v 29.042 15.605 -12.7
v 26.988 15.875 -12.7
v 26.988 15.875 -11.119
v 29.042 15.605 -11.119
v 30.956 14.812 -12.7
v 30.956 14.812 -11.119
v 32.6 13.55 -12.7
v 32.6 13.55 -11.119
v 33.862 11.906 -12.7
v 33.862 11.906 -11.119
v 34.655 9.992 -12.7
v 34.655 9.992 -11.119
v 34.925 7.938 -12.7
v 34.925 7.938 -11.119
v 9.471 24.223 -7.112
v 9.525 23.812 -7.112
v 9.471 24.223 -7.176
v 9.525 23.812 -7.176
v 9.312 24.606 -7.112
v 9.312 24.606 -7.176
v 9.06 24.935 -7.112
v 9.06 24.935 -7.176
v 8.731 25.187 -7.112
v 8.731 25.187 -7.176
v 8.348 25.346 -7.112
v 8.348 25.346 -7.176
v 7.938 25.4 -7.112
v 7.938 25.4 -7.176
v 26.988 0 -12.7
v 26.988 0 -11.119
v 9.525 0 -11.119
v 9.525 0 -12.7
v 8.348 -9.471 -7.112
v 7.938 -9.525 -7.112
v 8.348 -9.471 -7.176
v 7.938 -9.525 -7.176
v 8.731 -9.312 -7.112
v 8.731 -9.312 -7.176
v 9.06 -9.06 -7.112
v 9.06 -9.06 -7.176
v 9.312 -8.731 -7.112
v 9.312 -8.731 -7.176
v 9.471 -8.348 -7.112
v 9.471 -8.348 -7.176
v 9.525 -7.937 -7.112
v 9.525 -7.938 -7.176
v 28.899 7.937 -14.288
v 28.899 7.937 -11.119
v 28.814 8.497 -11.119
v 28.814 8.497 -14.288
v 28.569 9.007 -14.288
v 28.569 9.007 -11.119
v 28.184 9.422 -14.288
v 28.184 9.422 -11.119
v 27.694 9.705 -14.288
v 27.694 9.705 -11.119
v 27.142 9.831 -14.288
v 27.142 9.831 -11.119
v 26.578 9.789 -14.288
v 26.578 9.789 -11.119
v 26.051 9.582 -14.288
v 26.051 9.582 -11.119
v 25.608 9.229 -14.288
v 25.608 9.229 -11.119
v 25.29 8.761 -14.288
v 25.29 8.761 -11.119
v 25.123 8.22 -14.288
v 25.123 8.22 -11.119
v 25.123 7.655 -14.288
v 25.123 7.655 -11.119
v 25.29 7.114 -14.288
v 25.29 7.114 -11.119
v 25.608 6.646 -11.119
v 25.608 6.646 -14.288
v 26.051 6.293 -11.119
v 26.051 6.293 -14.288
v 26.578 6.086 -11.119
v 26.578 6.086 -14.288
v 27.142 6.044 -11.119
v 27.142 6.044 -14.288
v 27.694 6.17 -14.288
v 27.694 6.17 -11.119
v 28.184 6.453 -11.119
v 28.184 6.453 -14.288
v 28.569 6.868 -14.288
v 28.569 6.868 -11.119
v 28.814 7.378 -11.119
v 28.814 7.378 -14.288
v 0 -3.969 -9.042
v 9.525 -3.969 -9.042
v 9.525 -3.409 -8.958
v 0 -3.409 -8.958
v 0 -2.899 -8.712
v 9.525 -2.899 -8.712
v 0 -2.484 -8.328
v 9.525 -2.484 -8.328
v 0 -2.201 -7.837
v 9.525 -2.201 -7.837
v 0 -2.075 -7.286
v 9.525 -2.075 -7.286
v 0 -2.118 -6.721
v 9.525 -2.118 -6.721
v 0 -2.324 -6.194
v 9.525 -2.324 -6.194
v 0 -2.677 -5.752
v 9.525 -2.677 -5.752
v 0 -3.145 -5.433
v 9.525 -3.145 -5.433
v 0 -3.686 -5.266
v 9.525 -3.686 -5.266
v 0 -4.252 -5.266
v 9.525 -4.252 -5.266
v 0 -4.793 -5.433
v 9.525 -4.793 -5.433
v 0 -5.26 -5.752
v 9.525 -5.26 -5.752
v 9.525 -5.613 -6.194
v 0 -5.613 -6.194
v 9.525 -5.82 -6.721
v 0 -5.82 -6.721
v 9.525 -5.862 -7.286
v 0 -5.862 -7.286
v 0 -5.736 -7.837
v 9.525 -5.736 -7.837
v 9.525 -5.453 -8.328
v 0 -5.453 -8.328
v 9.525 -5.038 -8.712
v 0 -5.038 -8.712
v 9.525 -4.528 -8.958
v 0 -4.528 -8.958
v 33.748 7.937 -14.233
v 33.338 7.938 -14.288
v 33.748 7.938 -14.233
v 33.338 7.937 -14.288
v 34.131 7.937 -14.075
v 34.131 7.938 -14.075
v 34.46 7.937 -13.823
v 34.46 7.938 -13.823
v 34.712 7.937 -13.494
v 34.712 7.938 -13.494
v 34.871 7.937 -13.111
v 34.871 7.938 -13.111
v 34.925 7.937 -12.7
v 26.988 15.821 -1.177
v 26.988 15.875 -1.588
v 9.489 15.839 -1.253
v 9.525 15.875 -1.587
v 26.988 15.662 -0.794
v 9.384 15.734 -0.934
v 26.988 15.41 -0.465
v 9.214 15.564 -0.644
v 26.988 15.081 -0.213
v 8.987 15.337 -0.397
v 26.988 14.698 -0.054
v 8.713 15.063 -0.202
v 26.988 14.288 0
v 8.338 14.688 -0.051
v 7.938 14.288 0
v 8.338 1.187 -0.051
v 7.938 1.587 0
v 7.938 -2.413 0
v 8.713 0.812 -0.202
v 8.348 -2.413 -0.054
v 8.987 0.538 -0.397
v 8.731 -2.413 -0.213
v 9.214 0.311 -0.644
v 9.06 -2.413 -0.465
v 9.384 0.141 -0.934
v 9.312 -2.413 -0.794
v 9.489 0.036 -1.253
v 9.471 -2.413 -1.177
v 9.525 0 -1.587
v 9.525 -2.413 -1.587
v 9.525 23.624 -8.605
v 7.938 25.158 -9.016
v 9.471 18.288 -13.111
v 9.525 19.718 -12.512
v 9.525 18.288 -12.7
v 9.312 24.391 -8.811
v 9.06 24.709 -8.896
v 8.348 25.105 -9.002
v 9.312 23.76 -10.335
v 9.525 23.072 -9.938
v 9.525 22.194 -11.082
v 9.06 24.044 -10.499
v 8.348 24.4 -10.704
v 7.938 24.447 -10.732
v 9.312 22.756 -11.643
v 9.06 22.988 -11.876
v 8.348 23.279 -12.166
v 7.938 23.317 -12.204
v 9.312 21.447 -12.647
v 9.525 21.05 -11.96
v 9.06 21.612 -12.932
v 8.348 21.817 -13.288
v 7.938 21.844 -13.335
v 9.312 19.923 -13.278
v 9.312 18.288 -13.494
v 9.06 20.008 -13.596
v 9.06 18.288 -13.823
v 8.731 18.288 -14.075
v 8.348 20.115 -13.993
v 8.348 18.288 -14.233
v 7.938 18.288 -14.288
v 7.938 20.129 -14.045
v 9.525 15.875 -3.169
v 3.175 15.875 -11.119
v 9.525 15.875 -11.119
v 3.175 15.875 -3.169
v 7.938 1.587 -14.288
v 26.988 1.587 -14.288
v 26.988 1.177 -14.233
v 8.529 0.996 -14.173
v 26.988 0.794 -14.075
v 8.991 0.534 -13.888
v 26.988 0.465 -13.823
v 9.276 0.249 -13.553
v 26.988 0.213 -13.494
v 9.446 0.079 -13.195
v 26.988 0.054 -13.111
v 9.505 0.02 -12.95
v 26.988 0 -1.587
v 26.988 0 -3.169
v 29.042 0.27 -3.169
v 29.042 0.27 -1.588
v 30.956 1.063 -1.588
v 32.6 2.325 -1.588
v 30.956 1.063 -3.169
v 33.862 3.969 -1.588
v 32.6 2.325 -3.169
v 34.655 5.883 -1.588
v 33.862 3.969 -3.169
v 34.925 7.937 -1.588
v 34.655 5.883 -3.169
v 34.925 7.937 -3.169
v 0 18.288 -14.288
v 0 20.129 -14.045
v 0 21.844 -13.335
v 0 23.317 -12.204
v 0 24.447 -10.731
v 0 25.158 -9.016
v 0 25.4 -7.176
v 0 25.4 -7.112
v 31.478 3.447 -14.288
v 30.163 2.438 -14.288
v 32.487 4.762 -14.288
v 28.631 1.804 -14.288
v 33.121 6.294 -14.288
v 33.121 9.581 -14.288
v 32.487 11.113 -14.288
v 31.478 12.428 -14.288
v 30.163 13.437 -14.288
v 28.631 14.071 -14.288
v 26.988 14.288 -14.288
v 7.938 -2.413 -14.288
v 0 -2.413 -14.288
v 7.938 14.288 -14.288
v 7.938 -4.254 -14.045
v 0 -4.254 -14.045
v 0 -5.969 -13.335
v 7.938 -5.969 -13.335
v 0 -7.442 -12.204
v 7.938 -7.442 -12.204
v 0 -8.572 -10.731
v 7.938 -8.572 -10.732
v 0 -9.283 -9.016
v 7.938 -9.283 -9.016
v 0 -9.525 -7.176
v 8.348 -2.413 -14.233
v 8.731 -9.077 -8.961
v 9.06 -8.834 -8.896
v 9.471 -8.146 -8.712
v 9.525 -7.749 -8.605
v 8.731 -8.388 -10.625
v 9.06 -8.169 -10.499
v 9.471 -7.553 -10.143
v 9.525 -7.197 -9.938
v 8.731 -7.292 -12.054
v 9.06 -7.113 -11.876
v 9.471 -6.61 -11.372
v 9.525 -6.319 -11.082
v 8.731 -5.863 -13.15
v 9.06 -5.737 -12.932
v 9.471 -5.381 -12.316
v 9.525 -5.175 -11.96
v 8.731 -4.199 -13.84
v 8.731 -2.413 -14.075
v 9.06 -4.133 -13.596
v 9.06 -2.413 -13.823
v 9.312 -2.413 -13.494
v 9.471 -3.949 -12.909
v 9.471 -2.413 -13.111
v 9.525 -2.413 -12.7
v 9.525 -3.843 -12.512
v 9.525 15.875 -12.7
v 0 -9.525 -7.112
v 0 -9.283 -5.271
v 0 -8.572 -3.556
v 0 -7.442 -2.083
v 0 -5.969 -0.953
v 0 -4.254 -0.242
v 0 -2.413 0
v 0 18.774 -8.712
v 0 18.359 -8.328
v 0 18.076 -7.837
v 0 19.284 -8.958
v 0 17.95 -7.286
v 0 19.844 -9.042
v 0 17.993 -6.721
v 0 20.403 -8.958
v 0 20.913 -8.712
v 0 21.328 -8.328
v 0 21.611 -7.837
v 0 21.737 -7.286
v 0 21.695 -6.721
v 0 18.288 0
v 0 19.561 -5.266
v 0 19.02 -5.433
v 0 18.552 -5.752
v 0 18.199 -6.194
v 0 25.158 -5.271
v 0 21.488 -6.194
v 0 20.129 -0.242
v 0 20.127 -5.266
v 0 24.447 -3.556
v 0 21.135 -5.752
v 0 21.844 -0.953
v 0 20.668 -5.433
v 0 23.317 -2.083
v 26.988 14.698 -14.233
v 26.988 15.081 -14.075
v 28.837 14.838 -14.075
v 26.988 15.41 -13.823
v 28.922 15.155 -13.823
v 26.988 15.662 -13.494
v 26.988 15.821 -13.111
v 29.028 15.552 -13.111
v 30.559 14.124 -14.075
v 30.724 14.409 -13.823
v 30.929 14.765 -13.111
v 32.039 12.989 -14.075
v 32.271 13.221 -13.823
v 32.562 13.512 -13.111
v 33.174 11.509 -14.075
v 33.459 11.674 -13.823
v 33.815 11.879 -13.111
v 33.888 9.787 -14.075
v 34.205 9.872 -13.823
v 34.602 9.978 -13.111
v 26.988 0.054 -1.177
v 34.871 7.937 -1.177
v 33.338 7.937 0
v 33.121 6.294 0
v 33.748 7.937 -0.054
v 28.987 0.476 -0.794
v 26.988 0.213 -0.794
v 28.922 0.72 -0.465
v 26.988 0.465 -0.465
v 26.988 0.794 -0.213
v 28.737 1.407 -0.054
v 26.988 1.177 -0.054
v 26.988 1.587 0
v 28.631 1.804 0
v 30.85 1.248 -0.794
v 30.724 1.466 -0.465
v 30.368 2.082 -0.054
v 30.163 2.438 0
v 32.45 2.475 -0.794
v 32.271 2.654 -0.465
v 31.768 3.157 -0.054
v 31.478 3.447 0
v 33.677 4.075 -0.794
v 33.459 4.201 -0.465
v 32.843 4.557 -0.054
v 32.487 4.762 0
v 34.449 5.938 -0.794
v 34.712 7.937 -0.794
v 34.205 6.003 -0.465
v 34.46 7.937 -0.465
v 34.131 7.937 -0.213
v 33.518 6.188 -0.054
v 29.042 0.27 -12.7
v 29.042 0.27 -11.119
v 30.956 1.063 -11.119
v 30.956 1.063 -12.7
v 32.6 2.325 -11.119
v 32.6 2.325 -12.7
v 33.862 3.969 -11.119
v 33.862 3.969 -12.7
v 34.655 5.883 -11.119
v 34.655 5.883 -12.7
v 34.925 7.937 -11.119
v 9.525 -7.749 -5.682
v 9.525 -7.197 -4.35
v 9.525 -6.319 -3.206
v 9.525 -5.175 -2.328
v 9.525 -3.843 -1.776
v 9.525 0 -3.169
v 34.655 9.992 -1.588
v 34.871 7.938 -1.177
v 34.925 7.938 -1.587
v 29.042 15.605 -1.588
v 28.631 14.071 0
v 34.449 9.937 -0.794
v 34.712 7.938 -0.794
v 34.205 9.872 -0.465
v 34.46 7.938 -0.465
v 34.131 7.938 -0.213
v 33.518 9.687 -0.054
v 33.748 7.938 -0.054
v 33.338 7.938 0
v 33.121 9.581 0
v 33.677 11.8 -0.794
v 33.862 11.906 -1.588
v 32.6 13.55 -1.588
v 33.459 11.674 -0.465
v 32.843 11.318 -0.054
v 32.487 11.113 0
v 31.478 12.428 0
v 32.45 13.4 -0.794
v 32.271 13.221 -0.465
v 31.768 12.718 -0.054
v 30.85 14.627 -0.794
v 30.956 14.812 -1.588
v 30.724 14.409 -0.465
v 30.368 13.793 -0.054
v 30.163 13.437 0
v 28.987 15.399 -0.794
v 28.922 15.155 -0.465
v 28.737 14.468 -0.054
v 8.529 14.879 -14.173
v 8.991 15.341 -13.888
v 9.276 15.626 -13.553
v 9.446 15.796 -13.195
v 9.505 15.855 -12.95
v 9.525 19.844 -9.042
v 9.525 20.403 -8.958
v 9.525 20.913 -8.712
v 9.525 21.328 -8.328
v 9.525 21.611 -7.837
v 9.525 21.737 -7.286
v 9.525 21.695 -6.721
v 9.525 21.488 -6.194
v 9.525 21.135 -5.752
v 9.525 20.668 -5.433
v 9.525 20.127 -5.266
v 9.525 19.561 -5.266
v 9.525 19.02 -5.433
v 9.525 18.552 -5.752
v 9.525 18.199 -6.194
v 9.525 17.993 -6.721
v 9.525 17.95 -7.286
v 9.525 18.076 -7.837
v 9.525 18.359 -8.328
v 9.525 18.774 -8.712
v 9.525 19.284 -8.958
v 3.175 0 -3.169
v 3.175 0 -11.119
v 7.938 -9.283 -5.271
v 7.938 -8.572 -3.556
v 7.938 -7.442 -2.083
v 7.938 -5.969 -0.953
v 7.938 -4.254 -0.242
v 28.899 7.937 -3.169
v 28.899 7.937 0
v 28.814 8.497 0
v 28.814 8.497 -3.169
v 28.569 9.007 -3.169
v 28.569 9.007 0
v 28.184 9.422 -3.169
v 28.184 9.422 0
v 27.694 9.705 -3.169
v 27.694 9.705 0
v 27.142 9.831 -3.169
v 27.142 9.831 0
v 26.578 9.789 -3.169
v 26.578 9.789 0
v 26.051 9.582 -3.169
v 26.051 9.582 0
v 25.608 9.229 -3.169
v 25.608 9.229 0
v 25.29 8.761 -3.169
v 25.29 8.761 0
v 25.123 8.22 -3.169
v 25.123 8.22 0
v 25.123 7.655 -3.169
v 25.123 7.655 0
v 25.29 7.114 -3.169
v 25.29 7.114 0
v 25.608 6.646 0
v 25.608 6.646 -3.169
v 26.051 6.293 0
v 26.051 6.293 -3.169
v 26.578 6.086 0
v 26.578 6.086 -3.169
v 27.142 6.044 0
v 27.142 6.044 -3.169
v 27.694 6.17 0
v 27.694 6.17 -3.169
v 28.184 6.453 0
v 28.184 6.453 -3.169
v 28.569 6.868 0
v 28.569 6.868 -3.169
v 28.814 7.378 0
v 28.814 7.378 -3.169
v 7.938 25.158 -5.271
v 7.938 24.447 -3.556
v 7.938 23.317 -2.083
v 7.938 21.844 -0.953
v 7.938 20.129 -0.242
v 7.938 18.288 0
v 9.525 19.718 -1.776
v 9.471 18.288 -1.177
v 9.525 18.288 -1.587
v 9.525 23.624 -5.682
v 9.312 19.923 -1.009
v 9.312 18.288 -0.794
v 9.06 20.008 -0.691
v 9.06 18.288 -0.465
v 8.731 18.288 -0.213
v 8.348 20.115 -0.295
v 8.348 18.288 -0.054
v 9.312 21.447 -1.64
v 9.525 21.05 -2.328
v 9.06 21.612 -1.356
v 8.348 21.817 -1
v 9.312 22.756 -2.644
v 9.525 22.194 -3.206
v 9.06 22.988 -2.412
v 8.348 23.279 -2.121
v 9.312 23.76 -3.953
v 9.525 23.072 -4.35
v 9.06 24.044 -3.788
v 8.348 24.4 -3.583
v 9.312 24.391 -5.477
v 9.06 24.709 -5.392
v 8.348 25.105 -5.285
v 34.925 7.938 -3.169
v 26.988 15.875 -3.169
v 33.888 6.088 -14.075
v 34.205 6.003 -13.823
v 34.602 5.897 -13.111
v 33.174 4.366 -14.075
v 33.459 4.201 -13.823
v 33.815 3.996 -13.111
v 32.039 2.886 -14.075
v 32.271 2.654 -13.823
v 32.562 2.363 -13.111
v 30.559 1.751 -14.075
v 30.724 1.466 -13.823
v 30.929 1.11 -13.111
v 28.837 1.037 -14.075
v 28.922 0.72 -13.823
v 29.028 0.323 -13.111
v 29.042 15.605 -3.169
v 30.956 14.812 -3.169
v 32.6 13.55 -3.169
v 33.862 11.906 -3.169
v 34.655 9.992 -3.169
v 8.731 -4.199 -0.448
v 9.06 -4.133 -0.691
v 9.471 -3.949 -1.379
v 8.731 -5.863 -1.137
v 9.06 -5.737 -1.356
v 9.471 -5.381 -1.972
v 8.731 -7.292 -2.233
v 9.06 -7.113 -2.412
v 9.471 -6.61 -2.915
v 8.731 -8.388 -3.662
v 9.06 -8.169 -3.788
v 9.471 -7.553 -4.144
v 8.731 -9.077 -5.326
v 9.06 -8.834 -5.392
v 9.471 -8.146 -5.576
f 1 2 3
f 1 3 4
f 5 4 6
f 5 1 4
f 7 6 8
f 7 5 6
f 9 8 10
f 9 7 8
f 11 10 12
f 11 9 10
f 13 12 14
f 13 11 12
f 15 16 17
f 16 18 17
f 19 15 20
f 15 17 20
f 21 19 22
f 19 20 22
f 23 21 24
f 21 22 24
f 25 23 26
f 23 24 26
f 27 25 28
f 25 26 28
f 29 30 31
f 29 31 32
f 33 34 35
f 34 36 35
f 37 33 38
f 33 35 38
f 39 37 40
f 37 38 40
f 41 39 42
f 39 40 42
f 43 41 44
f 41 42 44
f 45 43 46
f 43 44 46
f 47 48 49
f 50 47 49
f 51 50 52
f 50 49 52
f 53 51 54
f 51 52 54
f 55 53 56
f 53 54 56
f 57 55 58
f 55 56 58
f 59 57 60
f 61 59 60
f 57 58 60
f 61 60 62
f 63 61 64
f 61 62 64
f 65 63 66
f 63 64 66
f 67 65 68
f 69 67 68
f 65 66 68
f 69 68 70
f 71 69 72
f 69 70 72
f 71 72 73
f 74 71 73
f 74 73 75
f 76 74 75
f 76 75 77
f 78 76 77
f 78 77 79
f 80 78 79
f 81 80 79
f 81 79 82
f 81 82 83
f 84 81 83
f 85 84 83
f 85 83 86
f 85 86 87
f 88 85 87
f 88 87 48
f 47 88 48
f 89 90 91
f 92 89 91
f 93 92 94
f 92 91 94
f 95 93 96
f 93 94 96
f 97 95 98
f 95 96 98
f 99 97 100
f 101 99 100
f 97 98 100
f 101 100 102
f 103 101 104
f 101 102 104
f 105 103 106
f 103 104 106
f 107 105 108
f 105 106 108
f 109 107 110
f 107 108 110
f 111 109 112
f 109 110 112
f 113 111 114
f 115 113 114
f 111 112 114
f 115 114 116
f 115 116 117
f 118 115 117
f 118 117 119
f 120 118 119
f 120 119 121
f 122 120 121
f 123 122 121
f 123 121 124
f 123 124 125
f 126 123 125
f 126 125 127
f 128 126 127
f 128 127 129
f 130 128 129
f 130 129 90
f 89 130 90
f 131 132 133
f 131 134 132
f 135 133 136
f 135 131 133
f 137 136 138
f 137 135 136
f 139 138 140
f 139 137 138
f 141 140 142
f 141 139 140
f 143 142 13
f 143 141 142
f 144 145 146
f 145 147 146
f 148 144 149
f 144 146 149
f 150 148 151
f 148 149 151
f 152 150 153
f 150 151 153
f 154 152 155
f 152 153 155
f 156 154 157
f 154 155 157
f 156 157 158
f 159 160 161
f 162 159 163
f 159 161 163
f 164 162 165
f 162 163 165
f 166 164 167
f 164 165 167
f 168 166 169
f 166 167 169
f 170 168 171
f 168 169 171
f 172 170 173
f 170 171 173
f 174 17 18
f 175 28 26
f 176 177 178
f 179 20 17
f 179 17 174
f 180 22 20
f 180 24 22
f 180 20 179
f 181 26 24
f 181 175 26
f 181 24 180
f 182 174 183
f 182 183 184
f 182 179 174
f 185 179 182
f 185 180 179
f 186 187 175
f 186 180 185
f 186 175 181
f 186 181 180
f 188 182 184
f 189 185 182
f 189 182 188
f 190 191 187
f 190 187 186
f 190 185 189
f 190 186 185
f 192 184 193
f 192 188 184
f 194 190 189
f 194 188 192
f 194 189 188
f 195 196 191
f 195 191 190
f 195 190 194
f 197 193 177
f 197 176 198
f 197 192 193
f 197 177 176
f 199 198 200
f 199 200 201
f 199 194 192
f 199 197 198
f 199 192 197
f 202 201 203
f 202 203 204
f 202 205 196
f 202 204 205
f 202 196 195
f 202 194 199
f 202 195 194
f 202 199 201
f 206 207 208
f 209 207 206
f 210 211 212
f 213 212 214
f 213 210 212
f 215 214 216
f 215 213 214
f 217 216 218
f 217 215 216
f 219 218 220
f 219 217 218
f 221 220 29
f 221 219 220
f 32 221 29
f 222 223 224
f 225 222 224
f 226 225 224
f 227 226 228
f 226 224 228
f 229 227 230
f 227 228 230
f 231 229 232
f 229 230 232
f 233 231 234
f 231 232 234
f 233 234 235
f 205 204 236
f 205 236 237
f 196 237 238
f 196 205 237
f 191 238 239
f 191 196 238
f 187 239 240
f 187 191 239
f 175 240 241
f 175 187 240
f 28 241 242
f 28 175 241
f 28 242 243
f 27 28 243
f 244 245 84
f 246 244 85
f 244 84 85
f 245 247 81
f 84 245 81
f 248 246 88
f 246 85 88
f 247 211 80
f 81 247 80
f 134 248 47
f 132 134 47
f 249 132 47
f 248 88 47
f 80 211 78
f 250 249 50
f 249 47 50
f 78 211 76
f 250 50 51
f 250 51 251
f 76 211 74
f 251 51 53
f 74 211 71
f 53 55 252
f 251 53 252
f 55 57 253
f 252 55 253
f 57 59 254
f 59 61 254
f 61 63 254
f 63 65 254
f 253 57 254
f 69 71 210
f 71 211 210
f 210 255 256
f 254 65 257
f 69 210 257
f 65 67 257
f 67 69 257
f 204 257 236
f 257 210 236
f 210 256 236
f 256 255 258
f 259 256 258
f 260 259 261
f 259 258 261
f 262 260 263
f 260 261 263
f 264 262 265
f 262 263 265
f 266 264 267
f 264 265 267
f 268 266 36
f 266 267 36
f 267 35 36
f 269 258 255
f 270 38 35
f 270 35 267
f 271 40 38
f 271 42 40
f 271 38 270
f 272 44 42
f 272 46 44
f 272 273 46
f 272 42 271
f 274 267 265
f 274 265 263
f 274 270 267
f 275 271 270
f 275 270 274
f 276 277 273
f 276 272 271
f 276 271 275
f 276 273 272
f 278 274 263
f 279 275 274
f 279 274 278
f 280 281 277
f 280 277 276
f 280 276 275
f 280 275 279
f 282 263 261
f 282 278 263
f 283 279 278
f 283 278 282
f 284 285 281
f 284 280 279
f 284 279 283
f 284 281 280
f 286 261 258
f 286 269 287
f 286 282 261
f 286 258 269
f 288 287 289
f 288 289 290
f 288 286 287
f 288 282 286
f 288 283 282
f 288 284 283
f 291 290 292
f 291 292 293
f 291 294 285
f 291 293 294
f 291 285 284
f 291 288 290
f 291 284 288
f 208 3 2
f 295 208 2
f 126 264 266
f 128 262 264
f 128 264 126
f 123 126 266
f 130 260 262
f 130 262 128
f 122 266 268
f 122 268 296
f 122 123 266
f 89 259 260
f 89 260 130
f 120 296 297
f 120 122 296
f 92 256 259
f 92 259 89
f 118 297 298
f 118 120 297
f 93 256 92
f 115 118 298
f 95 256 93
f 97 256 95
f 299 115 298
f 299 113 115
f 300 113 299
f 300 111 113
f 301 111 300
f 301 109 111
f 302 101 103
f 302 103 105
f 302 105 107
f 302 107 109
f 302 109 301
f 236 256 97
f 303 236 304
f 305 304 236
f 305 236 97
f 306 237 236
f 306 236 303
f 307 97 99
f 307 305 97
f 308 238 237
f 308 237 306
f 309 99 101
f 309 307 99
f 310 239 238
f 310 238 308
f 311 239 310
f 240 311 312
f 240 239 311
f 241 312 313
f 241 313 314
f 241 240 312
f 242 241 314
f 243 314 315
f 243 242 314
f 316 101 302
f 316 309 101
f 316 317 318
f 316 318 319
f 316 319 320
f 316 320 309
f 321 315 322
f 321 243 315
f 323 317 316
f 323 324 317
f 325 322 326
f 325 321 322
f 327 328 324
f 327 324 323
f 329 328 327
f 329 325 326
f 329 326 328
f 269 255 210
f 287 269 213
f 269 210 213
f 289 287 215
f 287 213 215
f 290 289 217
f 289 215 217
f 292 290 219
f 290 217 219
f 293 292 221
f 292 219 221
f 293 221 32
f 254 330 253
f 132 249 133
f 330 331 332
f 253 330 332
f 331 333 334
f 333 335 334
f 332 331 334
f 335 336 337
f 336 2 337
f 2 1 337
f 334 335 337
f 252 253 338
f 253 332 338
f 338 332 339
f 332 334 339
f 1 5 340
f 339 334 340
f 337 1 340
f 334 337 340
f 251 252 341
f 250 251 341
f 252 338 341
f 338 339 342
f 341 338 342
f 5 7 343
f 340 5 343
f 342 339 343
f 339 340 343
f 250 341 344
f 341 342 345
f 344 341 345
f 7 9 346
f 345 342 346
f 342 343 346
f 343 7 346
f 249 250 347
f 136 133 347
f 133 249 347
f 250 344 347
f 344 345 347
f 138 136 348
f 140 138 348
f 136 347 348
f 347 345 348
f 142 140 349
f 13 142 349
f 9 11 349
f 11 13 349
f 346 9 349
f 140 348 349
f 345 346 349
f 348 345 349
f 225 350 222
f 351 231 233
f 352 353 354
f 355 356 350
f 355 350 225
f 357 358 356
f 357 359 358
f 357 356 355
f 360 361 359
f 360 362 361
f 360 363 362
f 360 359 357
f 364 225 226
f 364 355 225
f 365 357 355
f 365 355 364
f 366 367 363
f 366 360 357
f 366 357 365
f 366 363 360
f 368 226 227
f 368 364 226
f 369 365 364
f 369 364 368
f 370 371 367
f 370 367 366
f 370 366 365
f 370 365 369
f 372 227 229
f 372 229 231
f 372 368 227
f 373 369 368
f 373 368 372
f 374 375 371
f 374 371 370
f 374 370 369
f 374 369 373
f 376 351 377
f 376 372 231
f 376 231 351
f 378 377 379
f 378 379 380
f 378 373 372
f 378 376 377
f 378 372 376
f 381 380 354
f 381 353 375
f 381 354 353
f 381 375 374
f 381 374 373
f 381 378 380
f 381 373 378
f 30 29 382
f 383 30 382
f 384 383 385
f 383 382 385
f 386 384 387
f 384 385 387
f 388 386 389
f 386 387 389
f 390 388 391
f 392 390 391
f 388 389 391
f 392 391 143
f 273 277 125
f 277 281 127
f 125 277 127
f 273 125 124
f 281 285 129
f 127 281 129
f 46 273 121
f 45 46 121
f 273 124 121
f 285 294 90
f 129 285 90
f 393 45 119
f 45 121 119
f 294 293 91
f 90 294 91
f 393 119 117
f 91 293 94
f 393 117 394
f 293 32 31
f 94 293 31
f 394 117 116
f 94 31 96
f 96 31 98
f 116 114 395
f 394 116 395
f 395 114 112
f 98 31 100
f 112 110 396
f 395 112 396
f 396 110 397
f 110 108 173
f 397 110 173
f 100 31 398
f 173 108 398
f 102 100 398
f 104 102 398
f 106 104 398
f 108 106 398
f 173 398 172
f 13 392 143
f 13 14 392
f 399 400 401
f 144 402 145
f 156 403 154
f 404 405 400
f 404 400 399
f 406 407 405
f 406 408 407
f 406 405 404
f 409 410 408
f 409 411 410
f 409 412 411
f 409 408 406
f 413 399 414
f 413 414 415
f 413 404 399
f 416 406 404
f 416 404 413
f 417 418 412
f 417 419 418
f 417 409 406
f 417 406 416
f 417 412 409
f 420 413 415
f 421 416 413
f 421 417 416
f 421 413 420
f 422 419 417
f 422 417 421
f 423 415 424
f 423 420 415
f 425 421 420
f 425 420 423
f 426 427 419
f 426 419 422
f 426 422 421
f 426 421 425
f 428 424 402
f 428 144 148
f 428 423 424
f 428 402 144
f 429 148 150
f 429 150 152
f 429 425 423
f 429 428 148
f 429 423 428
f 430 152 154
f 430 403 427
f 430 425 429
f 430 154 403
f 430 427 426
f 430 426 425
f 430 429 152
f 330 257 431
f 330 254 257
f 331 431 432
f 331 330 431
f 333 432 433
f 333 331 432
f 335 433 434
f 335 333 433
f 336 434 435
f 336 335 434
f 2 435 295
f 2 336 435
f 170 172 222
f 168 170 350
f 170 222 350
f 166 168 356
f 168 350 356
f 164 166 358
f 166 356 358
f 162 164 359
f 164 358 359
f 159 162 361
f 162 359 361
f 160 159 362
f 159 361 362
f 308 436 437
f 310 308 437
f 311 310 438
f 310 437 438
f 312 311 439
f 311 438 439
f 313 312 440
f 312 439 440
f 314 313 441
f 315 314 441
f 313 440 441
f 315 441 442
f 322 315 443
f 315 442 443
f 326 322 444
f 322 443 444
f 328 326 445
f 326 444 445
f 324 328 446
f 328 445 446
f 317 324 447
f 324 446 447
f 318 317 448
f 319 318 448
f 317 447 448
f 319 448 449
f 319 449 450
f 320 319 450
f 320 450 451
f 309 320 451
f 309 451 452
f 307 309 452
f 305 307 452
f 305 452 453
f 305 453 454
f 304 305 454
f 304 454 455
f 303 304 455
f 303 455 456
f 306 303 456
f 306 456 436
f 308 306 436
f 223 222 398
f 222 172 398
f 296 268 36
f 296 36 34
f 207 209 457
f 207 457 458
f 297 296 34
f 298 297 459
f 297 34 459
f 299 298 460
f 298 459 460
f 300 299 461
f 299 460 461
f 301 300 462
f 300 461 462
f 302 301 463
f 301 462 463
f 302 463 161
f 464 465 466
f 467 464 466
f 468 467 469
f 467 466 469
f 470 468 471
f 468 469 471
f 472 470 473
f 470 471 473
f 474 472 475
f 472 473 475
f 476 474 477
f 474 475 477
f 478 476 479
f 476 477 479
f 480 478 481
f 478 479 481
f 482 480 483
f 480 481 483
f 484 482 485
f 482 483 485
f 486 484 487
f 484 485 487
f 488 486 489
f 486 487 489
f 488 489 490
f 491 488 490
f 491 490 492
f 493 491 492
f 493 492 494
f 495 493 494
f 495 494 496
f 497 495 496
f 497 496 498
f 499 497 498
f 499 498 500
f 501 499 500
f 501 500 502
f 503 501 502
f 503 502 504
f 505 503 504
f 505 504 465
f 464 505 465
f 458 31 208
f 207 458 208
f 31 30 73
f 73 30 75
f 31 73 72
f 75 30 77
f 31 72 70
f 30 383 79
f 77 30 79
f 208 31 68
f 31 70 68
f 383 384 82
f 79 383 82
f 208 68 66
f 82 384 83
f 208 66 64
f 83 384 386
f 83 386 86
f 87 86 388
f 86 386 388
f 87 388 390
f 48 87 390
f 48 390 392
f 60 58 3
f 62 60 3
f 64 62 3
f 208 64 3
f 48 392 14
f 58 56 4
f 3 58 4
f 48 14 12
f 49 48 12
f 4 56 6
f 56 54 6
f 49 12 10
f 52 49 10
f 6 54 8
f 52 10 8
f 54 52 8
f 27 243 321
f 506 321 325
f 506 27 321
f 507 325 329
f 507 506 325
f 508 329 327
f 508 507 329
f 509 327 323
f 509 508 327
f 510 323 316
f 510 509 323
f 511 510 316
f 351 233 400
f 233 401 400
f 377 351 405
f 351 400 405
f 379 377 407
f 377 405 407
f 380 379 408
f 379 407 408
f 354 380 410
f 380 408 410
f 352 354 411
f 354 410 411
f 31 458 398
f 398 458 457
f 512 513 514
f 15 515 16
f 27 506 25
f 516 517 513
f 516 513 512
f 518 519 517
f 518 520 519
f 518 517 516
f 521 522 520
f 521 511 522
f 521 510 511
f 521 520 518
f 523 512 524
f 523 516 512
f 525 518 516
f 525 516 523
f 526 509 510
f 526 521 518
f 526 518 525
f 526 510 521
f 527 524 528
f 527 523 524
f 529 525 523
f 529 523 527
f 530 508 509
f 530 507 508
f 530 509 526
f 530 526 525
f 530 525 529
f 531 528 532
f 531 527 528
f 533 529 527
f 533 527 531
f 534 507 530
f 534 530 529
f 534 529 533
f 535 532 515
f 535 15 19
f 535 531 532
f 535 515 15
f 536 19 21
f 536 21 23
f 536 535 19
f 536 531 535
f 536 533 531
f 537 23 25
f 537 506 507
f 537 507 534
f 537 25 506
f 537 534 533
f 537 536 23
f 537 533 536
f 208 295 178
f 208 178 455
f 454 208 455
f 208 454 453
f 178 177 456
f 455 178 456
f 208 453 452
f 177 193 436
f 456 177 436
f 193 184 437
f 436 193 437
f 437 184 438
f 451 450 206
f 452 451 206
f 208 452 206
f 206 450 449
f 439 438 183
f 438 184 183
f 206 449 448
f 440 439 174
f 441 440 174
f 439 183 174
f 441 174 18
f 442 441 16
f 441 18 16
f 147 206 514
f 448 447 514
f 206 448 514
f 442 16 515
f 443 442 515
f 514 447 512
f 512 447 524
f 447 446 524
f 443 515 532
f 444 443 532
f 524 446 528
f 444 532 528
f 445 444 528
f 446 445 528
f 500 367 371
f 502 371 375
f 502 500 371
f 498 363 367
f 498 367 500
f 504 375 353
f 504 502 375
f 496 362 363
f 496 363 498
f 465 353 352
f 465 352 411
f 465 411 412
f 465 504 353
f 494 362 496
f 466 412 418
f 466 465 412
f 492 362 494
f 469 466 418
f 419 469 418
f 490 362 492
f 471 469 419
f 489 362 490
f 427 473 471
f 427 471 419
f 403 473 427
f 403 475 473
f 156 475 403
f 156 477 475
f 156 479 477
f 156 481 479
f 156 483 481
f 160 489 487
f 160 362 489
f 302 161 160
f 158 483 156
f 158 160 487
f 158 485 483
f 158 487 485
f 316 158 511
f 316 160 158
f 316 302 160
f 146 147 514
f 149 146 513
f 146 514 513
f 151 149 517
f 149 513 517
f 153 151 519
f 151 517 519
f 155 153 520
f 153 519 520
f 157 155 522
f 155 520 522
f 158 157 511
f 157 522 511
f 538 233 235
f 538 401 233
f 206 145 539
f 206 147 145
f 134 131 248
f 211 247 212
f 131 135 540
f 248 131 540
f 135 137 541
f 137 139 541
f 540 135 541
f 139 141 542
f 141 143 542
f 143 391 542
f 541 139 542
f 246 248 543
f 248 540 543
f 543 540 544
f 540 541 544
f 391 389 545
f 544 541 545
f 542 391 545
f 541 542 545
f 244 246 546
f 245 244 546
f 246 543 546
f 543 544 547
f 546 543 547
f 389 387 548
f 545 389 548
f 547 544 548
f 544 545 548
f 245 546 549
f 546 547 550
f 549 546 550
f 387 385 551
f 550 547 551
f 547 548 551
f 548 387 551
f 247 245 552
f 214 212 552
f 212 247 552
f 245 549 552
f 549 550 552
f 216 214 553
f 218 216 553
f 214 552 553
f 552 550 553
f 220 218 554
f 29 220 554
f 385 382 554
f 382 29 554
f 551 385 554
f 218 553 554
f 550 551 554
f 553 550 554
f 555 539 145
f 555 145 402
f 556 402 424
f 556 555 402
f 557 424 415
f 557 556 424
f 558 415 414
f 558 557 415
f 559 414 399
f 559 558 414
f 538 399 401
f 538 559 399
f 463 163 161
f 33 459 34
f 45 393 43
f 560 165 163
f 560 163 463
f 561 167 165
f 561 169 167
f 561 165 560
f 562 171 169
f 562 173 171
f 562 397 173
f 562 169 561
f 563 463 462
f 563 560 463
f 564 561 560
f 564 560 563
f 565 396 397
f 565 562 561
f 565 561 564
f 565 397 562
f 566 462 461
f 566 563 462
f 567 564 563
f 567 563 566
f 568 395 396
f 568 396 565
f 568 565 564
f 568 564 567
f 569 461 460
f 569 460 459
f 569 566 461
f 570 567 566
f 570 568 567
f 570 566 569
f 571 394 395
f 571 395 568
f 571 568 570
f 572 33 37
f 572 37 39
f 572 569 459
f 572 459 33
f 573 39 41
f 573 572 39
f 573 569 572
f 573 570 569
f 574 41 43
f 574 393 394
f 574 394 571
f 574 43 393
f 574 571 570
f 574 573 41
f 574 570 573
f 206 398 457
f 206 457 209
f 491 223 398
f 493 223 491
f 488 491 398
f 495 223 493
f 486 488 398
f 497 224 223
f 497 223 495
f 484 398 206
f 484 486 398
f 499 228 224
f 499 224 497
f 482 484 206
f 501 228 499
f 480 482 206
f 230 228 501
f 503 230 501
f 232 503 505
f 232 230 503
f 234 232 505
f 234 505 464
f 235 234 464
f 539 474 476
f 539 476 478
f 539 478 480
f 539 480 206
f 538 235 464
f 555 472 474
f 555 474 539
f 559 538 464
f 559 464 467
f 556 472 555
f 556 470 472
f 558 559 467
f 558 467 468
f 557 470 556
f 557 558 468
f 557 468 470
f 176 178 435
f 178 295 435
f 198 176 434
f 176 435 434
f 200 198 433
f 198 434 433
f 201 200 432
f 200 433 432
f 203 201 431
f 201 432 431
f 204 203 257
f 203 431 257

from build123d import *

# Parameters (mm, degrees)
SKETCH1_W             = 14.2875
SKETCH1_H             = 15.875
BOSS_EXTRUDE1_DEPTH   = 34.925
SKETCH2_W             = 7.9502
SKETCH2_H             = 15.875
CUT_EXTRUDE1_DEPTH    = 31.75
F_6_CLEARANCE_HOLE1_D = 3.7973
SKETCH5_W             = 14.2875
SKETCH5_H             = 9.525
BOSS_EXTRUDE2_DEPTH   = 9.525
F_6_CLEARANCE_HOLE2_D = 3.7973
FILLET1_R             = 7.112
FILLET3_R             = 7.9375
FILLET2_R             = 1.5875


with BuildPart() as part:
    # Sketch1 → Boss-Extrude1 (new body)
    with BuildSketch(Plane(origin=(0, 0, 0), x_dir=(0, 0, -1), z_dir=(1, 0, 0))):
        with Locations((7.14375, 7.9375)):
            Rectangle(SKETCH1_W, SKETCH1_H)
    extrude(amount=BOSS_EXTRUDE1_DEPTH)

    # Sketch2 → Cut-Extrude1 (cut)
    with BuildSketch(Plane(origin=(34.925, 0, 0), x_dir=(0, 0, -1), z_dir=(1, 0, 0))):
        with Locations((7.14375, 7.9375)):
            Rectangle(SKETCH2_W, SKETCH2_H)
    extrude(amount=-CUT_EXTRUDE1_DEPTH, mode=Mode.SUBTRACT)

    # #6 Clearance Hole1 (through all)
    with Locations(Plane(origin=(0, 0, -14.2875), x_dir=(-1, 0, 0), z_dir=(0, 0, -1))):
        with Locations((-27.0002, 7.9375)):
            Hole(F_6_CLEARANCE_HOLE1_D / 2)

    # Sketch5 → Boss-Extrude2 (add)
    with BuildSketch(Plane.ZY):
        with Locations((-7.14375, 20.6375)):
            Rectangle(SKETCH5_W, SKETCH5_H)
        with Locations((-7.14375, -4.7625)):
            Rectangle(SKETCH5_W, SKETCH5_H)
    extrude(amount=-BOSS_EXTRUDE2_DEPTH)

    # #6 Clearance Hole2 (through all)
    with Locations(Plane.ZY):
        with Locations((-7.14375, 19.84375), (-7.14375, -3.96875)):
            Hole(F_6_CLEARANCE_HOLE2_D / 2)

    # Fillet1
    fillet1_edges = [part.edges().sort_by_distance(p)[0] for p in [
        (4.7625, 25.4, -14.2875),
        (4.7625, 25.4, 0),
        (4.7625, -9.525, -14.2875),
        (4.7625, -9.525, 0),
    ]]
    fillet(fillet1_edges, radius=FILLET1_R)

    # Fillet3
    fillet3_edges = [part.edges().sort_by_distance(p)[0] for p in [
        (34.925, 0, -1.584325),
        (34.925, 0, -12.703175),
        (34.925, 15.875, -12.703175),
        (34.925, 15.875, -1.584325),
    ]]
    fillet(fillet3_edges, radius=FILLET3_R - 0.0001)  # a hair under: the kernel refuses the full size

    # Fillet2
    fillet2_edges = [part.edges().sort_by_distance(p)[0] for p in [
        (18.2563, 0, 0),
        (18.2563, 15.875, 0),
        (32.600189365, 13.550189365, 0),
        (32.600189365, 2.324810635, 0),
        (18.2563, 15.875, -14.2875),
        (18.2563, 0, -14.2875),
        (32.600189365, 13.550189365, -14.2875),
        (32.600189365, 2.324810635, -14.2875),
        (9.525, 17.0815, 0),
        (9.525, -1.2065, -14.2875),
        (9.525, 17.0815, -14.2875),
        (9.525, -9.525, -7.14375),
        (9.525, -1.2065, 0),
        (9.525, -7.441943428, -2.083056572),
        (9.525, -7.441943428, -12.204443428),
        (9.525, 25.4, -7.14375),
        (9.525, 23.316943428, -12.204443428),
        (9.525, 23.316943428, -2.083056572),
    ]]
    fillet(fillet2_edges, radius=FILLET2_R)


solid = part.part
